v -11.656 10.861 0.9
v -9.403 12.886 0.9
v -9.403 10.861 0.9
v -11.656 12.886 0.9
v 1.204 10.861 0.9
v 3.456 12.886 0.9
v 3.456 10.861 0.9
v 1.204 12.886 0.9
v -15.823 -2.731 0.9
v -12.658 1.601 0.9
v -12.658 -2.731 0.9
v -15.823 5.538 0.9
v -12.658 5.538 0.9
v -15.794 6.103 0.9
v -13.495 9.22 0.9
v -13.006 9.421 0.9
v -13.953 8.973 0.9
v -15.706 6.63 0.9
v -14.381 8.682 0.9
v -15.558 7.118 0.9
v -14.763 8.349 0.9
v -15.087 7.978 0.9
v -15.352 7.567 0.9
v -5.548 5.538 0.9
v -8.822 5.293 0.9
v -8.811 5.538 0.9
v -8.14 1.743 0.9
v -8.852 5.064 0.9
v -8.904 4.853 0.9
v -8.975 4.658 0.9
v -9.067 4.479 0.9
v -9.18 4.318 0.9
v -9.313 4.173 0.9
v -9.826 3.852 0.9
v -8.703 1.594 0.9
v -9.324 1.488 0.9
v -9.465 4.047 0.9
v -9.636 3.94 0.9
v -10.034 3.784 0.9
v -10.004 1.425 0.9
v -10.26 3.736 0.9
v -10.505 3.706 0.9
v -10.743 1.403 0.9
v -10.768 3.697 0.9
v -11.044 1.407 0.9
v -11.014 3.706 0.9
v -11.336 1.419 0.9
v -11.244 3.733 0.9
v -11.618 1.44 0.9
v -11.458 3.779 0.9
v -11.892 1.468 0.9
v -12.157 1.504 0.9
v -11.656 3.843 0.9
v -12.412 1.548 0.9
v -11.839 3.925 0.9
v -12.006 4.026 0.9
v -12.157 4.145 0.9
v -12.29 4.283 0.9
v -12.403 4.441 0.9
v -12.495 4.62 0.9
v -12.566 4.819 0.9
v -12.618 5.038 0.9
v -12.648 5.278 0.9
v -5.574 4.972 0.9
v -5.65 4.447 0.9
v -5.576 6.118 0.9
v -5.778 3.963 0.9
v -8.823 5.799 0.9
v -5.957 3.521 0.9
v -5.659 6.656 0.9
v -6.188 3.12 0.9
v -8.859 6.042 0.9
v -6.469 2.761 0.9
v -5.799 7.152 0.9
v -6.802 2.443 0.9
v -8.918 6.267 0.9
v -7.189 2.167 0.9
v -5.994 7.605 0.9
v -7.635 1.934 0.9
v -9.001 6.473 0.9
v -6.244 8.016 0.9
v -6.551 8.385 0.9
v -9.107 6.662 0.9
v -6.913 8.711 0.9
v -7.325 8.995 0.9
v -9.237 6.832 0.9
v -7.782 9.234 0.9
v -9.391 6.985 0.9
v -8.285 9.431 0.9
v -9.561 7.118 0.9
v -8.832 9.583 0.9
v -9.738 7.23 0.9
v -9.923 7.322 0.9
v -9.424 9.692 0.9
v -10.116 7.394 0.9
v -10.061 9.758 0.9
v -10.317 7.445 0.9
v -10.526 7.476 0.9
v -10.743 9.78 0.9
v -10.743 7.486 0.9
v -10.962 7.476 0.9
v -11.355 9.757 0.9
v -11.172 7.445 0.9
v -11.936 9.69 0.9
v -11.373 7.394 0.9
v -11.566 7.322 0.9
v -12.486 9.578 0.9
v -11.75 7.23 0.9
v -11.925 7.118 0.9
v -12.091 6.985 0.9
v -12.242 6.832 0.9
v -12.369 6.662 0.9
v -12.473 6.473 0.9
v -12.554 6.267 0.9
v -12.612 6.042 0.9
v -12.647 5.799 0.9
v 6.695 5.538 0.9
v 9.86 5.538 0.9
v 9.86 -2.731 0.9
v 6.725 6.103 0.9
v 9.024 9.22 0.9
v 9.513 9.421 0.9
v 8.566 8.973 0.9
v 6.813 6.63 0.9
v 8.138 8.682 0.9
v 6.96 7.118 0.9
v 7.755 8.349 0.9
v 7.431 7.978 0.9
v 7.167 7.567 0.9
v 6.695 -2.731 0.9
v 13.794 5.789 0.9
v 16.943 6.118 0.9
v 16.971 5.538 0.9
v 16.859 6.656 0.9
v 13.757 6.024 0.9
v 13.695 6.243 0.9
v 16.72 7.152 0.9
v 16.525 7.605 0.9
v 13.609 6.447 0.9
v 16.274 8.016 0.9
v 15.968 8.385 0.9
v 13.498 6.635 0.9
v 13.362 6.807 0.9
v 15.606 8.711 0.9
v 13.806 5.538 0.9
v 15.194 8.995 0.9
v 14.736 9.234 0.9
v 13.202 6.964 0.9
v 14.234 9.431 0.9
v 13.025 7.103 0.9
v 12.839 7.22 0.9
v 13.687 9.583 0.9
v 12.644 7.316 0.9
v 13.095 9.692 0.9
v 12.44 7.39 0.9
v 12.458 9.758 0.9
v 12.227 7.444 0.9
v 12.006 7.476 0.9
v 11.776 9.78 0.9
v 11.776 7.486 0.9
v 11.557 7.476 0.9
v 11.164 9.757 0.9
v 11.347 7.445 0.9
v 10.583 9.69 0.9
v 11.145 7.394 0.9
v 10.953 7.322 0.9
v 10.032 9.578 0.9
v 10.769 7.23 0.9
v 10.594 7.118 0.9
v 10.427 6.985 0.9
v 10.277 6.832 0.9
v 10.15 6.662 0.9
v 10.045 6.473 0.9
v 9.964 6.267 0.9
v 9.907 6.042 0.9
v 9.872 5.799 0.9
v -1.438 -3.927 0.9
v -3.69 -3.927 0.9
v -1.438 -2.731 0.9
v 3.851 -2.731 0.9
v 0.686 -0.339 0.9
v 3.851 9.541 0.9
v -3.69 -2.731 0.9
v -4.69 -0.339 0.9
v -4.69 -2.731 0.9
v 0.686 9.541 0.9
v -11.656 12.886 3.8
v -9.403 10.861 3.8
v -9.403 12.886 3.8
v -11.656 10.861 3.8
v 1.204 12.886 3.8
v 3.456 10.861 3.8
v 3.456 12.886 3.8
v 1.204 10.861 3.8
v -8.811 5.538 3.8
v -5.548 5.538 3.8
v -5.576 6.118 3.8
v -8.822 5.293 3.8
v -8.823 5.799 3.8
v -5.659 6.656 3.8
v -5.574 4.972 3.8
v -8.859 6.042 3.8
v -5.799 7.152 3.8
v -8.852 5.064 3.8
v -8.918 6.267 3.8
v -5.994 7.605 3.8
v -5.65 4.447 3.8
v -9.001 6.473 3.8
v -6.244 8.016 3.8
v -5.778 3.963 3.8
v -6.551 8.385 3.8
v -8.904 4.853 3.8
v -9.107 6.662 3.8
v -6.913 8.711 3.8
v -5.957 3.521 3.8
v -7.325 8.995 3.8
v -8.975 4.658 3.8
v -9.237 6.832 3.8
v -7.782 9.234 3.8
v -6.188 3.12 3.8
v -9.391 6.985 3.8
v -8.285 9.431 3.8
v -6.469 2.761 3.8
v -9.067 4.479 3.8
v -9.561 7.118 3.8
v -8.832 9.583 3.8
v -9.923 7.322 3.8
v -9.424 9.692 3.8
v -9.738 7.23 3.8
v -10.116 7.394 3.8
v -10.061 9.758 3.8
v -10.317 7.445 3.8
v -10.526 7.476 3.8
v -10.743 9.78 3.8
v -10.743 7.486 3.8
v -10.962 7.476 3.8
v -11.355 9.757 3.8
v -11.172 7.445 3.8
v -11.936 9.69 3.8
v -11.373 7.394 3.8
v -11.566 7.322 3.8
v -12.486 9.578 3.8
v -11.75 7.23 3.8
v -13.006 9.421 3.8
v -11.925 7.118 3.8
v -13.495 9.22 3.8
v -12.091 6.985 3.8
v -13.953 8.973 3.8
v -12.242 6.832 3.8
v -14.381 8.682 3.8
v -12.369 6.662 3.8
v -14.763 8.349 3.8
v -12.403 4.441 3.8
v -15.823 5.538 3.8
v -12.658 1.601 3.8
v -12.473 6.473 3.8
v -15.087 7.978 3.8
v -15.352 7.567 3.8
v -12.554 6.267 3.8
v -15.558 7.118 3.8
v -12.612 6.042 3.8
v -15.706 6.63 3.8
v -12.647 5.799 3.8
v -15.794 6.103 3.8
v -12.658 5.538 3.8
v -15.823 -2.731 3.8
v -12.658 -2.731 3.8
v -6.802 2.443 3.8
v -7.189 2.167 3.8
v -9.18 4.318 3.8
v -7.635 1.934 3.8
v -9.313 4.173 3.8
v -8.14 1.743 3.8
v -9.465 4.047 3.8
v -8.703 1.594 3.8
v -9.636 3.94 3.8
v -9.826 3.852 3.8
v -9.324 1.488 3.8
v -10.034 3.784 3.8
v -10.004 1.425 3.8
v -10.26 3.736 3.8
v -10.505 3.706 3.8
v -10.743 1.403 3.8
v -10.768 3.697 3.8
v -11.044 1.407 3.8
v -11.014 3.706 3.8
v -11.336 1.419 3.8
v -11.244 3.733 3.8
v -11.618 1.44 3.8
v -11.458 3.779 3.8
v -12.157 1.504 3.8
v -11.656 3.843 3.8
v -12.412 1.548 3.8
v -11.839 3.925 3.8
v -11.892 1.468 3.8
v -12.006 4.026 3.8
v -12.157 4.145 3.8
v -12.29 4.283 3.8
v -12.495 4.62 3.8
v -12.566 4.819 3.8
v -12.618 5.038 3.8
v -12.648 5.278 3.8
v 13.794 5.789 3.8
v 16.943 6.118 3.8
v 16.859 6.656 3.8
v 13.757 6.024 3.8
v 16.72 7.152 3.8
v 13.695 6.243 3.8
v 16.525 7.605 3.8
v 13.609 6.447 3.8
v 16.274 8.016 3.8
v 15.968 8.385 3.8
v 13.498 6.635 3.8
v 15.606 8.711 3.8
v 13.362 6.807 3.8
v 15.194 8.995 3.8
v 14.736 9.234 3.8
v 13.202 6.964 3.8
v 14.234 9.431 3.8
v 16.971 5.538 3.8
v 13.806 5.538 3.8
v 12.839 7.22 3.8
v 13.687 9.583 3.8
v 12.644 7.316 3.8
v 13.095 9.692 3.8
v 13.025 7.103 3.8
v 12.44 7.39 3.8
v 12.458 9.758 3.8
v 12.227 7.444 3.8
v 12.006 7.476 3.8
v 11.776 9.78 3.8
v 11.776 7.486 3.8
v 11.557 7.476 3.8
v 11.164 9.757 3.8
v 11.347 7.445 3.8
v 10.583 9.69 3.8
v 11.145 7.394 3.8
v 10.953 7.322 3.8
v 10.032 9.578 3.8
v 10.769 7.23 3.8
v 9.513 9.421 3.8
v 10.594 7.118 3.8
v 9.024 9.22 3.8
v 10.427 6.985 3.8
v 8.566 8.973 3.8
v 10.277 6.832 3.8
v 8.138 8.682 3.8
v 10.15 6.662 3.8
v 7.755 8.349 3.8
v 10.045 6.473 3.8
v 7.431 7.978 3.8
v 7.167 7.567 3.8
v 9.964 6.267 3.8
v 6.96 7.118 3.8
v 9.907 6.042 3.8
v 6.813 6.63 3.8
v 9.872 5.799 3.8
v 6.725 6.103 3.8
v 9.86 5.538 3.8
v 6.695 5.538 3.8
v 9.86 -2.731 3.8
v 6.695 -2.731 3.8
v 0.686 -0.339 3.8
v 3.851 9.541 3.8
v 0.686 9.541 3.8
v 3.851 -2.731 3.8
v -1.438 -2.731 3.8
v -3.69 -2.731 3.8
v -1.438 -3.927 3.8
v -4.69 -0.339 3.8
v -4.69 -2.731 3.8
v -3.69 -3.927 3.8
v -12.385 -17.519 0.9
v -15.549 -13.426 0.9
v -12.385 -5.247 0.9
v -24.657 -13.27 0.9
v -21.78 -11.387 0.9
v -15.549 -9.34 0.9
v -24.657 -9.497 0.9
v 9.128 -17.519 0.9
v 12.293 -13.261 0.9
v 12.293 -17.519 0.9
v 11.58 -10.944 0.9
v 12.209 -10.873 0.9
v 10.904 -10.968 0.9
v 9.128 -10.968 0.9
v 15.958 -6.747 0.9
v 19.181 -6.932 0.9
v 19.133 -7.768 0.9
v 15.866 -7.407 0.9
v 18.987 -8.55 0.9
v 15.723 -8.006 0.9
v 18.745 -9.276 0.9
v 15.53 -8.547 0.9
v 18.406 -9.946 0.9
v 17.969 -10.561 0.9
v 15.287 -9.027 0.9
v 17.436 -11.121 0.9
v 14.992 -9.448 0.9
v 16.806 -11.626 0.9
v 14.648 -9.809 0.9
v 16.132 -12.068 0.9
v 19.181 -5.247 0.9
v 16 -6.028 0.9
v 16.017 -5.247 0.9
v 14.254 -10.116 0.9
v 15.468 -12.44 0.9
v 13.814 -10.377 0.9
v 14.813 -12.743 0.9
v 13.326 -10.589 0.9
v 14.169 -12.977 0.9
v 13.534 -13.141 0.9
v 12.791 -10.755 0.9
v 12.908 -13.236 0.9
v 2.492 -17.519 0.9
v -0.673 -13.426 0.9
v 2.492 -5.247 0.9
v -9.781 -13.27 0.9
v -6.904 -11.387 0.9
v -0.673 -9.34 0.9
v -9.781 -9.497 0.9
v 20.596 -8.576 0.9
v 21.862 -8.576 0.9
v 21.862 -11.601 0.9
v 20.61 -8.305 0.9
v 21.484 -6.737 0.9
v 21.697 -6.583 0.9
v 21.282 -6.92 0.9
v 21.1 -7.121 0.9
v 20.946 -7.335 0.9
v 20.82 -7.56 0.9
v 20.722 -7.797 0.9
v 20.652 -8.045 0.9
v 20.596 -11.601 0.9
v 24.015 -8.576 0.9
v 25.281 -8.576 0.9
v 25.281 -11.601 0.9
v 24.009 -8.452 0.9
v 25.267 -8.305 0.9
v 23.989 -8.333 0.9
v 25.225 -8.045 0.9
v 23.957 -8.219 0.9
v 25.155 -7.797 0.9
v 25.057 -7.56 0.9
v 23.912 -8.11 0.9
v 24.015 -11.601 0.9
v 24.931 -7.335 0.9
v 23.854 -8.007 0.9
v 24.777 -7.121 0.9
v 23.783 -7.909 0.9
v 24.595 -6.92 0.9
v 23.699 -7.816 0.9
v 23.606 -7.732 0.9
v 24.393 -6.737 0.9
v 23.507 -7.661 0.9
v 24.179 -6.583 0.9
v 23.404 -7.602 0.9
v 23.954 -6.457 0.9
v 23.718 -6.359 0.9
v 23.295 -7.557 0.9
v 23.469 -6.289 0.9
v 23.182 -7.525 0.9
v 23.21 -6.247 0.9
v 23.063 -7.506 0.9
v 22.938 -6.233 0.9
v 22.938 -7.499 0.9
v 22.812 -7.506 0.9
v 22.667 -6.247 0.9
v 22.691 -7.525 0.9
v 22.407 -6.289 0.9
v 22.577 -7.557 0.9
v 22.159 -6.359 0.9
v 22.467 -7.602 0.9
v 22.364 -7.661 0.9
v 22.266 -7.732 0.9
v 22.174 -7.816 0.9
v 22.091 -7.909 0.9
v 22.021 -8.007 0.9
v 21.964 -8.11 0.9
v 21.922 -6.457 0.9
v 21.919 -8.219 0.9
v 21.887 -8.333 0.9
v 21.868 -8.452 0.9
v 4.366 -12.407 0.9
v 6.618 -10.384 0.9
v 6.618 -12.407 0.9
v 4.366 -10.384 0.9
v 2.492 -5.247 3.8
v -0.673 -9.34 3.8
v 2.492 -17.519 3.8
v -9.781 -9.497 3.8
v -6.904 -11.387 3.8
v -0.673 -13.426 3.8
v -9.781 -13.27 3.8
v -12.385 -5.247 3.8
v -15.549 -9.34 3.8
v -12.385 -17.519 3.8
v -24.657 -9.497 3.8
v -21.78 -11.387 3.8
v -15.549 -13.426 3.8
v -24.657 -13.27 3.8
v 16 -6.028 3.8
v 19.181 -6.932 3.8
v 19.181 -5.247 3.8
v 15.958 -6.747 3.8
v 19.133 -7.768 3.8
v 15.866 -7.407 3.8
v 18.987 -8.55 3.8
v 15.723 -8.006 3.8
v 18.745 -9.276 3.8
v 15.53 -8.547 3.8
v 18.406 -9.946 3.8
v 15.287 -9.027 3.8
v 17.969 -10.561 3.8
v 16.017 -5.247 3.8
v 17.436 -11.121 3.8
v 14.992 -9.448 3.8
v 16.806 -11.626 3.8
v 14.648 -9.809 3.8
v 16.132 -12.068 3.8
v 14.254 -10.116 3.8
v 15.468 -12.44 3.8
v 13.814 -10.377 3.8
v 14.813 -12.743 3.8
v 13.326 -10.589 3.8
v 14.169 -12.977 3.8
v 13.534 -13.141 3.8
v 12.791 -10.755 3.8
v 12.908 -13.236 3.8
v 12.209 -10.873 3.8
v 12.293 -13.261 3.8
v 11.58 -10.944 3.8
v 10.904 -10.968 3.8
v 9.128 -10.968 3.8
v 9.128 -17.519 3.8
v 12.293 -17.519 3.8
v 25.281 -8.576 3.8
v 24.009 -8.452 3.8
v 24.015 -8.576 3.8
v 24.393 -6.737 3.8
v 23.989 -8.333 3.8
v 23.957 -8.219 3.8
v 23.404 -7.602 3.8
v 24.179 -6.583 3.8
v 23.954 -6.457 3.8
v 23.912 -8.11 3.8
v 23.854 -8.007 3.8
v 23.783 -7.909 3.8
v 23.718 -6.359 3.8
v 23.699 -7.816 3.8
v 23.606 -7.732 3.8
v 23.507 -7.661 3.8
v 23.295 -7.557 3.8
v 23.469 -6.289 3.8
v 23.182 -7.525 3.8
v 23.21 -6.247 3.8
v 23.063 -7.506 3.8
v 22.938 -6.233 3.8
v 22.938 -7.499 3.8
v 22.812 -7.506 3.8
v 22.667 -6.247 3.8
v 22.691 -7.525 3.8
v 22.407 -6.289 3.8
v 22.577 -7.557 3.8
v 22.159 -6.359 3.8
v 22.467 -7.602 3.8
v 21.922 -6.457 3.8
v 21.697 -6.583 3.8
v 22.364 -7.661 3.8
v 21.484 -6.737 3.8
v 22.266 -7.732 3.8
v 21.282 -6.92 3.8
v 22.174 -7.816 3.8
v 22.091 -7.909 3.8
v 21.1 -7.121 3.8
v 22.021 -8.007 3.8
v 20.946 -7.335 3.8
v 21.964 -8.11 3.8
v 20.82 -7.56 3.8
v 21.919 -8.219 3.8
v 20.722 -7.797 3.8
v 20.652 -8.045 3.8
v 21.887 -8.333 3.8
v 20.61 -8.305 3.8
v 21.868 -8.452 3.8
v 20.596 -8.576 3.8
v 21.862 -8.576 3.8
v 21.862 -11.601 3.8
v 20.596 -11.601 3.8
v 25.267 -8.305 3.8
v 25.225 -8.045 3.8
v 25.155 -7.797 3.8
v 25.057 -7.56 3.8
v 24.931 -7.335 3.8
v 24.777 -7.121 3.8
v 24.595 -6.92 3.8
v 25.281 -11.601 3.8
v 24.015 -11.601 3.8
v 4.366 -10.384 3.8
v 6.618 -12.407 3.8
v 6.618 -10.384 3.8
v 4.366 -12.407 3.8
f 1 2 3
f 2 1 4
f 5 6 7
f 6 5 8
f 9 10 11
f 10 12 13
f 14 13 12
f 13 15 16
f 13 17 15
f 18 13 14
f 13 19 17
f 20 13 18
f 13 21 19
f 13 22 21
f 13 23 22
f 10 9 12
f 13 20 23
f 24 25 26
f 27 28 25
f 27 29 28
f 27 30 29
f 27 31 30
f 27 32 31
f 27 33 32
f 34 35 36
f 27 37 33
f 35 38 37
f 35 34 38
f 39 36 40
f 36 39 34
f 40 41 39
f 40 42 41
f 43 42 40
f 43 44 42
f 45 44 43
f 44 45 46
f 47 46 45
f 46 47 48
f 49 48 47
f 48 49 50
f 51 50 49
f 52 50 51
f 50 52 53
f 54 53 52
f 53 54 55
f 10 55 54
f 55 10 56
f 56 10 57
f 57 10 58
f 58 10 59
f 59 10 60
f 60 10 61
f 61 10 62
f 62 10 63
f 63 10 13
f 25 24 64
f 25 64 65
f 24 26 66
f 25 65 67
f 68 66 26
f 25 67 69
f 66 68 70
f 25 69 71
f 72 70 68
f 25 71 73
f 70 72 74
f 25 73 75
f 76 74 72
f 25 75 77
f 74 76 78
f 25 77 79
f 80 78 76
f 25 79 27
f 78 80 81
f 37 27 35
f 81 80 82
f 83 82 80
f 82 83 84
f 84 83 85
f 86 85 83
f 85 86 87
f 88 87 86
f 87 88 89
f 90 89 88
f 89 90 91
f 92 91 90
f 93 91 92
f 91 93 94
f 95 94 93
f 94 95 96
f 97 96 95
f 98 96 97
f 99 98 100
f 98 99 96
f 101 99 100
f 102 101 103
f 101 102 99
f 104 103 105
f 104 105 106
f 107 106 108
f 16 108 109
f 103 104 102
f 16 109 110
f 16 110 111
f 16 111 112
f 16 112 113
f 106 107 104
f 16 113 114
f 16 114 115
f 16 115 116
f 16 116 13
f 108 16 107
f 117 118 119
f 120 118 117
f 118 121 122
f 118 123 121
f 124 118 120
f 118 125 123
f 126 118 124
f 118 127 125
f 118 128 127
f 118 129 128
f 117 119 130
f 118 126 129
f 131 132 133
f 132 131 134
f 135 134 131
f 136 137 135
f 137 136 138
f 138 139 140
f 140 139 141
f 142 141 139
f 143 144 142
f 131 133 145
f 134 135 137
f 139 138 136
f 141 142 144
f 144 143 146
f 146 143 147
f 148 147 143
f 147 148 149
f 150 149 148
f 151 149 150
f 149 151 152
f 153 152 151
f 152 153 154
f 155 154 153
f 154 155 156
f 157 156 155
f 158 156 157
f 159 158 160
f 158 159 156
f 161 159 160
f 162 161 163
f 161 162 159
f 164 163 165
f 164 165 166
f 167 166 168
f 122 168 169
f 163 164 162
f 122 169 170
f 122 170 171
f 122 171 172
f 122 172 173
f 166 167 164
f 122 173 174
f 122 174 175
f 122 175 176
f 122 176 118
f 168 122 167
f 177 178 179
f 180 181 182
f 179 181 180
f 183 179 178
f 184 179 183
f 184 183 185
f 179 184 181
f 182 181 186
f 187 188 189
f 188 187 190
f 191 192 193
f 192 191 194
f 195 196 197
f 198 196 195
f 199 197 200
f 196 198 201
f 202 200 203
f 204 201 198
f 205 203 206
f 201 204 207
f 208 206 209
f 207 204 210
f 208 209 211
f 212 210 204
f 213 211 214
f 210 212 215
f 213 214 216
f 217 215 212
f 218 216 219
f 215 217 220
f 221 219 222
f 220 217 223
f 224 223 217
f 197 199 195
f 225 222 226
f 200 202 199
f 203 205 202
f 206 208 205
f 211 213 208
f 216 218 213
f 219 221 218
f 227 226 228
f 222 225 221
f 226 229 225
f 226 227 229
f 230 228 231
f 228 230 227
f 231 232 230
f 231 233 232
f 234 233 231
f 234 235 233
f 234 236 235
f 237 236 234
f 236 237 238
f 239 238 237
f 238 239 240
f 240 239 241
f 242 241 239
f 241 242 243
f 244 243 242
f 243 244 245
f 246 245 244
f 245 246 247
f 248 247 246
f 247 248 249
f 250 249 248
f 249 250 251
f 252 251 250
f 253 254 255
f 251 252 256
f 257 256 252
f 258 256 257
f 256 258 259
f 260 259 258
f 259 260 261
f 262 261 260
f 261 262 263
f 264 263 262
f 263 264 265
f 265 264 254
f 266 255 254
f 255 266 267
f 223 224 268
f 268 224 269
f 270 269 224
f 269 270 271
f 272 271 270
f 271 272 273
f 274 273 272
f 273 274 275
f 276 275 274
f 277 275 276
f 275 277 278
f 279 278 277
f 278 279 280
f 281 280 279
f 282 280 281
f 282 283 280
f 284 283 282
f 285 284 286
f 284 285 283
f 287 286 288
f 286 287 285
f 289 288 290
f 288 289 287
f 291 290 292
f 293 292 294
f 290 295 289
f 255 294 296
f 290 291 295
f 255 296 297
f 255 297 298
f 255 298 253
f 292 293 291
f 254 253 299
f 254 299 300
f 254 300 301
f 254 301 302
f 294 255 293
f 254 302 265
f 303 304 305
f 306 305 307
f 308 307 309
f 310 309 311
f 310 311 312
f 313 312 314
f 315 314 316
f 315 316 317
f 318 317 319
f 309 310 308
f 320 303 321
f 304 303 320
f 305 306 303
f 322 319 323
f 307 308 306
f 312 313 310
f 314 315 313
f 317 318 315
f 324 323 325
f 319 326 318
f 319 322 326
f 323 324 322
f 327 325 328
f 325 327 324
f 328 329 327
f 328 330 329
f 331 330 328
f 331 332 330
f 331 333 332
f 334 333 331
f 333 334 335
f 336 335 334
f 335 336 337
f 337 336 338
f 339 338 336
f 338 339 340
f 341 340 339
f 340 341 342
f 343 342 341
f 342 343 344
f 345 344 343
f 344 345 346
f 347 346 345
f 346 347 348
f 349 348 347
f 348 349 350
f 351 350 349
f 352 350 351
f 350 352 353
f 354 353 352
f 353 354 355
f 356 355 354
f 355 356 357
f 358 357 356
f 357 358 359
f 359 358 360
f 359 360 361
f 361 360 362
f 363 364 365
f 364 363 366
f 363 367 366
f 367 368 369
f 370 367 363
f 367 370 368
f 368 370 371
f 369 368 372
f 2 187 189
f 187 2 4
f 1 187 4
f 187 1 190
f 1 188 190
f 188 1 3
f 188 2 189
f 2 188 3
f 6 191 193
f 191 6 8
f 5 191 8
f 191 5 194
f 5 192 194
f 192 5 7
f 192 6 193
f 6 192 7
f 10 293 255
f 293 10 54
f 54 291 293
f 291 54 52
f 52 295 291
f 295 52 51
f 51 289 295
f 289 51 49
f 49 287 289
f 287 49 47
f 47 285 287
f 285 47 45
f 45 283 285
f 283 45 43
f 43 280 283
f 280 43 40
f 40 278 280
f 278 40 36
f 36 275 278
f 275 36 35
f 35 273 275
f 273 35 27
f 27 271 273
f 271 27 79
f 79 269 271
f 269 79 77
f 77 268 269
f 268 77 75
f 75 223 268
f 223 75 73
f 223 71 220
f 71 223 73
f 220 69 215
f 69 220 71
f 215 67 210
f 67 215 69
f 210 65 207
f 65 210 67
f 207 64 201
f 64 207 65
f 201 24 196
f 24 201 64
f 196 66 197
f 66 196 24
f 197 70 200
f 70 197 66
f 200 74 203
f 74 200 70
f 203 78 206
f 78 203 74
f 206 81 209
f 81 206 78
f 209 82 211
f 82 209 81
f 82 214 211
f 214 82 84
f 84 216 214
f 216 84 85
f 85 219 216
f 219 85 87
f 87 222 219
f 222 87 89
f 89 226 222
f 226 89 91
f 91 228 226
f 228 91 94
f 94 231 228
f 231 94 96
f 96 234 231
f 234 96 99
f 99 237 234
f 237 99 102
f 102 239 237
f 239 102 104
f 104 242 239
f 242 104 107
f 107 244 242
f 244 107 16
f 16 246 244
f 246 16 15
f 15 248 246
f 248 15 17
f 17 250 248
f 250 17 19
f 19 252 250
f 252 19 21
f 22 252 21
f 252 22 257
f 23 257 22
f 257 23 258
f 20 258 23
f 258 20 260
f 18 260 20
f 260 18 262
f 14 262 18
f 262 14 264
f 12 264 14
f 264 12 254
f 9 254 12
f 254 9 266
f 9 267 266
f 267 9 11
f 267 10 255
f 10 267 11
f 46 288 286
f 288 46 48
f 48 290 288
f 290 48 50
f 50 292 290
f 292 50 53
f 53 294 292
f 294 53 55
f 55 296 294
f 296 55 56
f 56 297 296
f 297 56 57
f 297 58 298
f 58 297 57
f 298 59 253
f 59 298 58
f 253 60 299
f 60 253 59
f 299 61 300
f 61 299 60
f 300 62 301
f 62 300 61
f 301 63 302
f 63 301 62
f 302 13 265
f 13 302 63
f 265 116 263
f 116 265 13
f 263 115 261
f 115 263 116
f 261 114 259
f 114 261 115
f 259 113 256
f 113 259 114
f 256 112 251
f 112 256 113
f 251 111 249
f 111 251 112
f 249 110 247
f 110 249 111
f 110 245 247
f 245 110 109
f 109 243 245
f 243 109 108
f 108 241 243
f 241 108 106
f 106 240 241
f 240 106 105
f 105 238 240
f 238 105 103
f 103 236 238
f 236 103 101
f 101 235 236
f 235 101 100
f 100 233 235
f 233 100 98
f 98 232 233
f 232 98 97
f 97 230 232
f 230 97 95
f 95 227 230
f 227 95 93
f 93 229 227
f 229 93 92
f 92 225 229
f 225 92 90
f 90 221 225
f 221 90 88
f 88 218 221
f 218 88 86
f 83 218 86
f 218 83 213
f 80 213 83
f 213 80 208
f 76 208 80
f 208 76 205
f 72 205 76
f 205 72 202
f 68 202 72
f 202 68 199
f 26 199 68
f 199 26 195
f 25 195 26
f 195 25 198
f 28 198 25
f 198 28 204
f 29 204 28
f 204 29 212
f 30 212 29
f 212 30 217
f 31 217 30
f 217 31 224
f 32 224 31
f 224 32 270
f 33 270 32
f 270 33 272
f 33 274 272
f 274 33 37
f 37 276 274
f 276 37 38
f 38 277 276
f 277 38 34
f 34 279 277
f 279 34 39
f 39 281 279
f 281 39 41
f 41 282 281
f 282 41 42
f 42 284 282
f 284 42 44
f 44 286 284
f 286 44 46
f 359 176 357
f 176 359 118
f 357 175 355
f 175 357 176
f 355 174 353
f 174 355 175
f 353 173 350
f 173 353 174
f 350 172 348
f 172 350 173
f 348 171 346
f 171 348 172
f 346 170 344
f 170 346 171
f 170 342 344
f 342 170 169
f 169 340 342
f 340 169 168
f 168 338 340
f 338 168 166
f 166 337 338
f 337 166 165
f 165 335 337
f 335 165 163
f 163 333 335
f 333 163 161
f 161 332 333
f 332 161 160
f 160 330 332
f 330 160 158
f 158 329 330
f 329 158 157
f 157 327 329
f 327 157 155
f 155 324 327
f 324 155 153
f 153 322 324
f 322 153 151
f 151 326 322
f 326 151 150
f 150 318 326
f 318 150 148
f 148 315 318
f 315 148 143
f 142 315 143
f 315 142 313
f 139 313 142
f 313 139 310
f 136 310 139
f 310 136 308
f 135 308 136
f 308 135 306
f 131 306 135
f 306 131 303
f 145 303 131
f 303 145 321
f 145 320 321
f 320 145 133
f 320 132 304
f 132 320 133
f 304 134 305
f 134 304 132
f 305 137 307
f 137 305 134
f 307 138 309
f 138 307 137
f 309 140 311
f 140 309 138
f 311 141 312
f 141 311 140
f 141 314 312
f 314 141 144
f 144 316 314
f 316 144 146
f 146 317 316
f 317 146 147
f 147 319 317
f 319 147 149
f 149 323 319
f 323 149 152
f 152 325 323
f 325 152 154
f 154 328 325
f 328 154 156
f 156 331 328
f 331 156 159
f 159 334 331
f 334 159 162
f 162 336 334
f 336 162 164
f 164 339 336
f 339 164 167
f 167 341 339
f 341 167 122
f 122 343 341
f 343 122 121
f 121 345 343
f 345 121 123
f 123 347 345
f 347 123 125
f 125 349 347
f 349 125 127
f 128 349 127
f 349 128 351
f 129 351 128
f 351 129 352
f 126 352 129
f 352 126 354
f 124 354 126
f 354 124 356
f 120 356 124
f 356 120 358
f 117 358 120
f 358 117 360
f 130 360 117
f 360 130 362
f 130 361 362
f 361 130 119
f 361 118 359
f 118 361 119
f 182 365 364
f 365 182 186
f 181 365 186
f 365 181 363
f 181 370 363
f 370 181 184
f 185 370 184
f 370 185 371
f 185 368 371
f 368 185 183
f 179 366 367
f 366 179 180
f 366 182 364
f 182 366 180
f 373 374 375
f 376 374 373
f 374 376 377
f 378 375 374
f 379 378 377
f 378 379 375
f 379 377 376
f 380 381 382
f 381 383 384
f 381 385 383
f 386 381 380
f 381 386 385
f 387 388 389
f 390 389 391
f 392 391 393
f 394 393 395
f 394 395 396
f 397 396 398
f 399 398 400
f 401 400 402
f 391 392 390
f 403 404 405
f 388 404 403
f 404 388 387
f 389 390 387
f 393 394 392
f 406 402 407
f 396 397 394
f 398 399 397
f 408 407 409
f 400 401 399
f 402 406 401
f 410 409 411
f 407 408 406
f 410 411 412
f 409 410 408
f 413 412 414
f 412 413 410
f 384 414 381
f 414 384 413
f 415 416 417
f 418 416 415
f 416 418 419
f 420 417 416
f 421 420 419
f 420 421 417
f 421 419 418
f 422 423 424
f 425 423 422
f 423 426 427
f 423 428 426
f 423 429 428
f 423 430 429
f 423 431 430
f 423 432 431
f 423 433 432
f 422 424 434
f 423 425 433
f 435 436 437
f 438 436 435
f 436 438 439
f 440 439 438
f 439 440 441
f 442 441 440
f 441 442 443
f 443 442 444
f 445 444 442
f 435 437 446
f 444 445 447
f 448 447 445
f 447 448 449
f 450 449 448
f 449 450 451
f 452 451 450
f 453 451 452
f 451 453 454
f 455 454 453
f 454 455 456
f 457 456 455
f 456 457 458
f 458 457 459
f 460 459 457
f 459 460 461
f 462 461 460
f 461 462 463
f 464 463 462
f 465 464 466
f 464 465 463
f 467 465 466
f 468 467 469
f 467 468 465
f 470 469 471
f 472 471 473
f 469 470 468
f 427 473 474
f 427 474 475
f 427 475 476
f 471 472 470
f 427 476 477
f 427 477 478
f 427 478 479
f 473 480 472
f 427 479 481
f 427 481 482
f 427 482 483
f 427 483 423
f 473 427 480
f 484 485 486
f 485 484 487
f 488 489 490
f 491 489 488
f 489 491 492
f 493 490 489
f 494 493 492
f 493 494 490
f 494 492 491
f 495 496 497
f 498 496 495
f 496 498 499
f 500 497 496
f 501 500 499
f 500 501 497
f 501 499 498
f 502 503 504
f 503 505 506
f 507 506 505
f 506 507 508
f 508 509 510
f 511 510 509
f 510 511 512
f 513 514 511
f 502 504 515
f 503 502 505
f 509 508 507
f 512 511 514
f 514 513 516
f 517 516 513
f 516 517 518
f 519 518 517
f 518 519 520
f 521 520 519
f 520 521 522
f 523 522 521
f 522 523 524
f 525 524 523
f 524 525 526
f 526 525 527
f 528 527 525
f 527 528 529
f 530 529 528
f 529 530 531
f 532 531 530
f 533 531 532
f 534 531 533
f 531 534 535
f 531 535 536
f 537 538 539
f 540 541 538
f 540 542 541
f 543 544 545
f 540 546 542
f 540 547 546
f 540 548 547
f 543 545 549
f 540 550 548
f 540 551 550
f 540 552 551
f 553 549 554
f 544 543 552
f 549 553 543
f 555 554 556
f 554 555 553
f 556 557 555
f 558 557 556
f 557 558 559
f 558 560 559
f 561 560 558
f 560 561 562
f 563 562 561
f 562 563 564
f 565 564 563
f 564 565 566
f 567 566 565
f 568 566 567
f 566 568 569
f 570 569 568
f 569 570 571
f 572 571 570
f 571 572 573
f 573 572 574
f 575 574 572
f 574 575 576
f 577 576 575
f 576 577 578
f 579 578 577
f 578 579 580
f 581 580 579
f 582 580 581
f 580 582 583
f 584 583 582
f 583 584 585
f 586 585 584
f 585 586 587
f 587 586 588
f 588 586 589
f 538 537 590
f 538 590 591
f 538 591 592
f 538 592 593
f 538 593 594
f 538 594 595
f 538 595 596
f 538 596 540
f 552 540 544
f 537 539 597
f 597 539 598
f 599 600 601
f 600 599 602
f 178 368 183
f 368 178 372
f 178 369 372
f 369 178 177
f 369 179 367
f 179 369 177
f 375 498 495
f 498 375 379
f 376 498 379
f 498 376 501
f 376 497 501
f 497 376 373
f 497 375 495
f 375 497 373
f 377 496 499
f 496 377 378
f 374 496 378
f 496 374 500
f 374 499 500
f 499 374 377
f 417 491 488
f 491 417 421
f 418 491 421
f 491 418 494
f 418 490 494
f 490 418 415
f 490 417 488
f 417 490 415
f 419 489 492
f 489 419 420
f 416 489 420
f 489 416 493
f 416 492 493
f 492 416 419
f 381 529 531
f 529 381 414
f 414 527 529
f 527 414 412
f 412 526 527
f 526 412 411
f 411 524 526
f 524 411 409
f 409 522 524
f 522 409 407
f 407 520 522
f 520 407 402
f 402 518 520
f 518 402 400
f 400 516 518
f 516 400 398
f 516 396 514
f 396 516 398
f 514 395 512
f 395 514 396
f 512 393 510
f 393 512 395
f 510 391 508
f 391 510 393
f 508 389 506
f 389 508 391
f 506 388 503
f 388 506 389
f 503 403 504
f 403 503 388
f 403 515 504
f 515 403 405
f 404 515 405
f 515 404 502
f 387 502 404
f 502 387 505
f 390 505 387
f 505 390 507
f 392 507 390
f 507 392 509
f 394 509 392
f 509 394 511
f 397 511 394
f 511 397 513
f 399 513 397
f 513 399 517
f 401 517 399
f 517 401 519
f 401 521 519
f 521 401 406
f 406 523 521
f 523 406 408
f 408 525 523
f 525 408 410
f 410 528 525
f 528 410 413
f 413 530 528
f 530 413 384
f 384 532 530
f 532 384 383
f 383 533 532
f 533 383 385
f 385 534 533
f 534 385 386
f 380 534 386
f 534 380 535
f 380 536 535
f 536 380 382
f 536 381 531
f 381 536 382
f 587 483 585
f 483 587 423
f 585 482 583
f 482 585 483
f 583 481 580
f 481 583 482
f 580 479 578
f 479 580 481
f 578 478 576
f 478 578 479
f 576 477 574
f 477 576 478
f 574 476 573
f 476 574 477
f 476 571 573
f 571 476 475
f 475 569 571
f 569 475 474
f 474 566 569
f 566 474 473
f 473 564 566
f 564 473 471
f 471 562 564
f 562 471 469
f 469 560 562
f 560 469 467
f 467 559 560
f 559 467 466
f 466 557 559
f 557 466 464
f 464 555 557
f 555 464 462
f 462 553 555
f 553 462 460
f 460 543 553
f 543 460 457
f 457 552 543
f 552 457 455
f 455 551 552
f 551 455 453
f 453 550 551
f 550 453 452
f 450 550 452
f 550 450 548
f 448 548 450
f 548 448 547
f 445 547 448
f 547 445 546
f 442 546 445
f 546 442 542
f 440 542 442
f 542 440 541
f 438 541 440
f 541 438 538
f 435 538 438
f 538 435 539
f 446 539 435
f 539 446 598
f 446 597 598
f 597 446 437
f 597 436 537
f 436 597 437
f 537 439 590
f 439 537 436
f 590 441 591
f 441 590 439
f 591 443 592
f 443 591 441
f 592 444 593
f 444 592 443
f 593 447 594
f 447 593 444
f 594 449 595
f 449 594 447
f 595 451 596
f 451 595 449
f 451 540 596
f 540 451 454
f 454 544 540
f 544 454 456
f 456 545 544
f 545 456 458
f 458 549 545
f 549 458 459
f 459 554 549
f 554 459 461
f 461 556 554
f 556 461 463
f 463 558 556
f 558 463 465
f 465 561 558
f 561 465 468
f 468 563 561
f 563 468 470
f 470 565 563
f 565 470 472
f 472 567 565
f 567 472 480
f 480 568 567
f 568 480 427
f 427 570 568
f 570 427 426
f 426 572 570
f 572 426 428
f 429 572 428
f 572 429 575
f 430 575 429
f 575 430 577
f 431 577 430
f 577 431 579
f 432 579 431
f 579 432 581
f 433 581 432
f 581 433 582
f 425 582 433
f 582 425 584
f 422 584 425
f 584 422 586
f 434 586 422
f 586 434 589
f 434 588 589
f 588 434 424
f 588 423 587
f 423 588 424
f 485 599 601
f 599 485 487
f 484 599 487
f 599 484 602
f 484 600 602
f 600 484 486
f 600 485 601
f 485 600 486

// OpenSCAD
$fn = 48;
  // syllabics (overlaid on icon, tallest)
  translate([0, 4.894, 0.900]) linear_extrude(height=2.900) text("ᑮᒨᒋ", size=12.122, halign="center", valign="center", font="Euphemia UCAS:style=Bold");
  translate([0, -9.894, 0.900]) linear_extrude(height=2.900) text("ᐊᐚᓯᐢ", size=12.122, halign="center", valign="center", font="Euphemia UCAS:style=Bold");
